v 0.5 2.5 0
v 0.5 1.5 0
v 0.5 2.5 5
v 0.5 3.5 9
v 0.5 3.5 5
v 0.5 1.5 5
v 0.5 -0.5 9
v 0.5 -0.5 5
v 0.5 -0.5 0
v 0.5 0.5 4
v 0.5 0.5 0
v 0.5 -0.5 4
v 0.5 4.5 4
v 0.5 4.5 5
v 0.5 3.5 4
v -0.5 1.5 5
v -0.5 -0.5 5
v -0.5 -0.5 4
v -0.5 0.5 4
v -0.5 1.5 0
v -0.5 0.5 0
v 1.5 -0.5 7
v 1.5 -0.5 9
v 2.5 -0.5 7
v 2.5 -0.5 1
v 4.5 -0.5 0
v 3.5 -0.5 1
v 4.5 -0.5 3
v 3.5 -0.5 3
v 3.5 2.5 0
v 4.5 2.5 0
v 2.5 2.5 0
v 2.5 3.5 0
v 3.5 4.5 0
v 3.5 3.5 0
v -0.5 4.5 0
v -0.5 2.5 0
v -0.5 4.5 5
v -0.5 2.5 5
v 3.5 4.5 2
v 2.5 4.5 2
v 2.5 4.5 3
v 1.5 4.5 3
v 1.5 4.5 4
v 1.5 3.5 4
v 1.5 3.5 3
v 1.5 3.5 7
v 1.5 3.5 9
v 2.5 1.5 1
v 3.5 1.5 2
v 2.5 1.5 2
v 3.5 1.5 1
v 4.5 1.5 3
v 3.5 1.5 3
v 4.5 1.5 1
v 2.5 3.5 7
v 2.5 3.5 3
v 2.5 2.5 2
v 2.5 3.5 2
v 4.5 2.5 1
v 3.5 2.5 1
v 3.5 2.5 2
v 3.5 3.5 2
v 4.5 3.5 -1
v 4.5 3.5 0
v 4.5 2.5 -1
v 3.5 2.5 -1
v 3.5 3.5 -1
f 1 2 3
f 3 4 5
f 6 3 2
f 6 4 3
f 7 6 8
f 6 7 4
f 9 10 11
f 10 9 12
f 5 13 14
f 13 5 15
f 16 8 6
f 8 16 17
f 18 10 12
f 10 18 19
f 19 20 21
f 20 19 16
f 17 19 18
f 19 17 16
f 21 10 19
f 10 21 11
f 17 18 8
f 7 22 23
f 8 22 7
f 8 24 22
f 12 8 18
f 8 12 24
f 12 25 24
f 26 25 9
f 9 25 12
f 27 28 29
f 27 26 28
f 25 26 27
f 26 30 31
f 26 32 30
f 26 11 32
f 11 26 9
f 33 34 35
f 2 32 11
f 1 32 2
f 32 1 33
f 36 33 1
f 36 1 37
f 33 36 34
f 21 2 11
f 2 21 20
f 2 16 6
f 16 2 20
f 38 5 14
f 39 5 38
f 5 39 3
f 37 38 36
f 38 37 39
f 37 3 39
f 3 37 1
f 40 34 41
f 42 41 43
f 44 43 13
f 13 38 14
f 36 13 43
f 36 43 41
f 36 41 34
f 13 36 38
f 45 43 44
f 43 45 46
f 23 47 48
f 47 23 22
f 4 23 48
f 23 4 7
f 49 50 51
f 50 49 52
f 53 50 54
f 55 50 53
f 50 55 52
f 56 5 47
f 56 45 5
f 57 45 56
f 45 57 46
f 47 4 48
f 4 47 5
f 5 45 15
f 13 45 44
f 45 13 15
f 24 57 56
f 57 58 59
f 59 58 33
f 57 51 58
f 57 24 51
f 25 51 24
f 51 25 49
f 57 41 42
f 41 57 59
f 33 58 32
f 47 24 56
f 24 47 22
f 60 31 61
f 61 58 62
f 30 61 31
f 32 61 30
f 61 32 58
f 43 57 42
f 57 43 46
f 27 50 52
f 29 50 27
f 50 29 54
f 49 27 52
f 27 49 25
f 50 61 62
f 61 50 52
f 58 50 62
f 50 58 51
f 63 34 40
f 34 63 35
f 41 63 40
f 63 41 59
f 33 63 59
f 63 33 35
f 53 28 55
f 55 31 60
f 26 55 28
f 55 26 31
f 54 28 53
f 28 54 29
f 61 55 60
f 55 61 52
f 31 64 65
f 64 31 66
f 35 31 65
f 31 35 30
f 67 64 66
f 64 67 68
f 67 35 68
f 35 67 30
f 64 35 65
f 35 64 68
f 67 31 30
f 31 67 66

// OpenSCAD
union() {
    translate([0, 0, 4.5]) color([1, 0, 0]) cube([1, 1, 1], center=true);
    translate([0, 1, 2.5]) cube([1, 1, 5], center=true);
    translate([0, 3, 2.5]) cube([1, 1, 5], center=true);
    translate([0, 4, 2.5]) cube([1, 1, 5], center=true);
    translate([1, 0, 4.5]) cube([1, 1, 9], center=true);
    translate([1, 1, 4.5]) cube([1, 1, 9], center=true);
    translate([1, 2, 4.5]) cube([1, 1, 9], center=true);
    translate([1, 3, 4.5]) cube([1, 1, 9], center=true);
    translate([1, 4, 2.0]) cube([1, 1, 4], center=true);
    translate([2, 0, 3.5]) cube([1, 1, 7], center=true);
    translate([2, 1, 3.5]) cube([1, 1, 7], center=true);
    translate([2, 2, 3.5]) cube([1, 1, 7], center=true);
    translate([2, 3, 3.5]) cube([1, 1, 7], center=true);
    translate([2, 4, 1.5]) cube([1, 1, 3], center=true);
    translate([3, 0, 0.5]) cube([1, 1, 1], center=true);
    translate([3, 1, 0.5]) cube([1, 1, 1], center=true);
    translate([3, 2, 1.0]) cube([1, 1, 2], center=true);
    translate([3, 4, 1.0]) cube([1, 1, 2], center=true);
    translate([4, 0, 1.5]) cube([1, 1, 3], center=true);
    translate([4, 1, 1.5]) cube([1, 1, 3], center=true);
    translate([4, 2, 0.5]) cube([1, 1, 1], center=true);
    translate([4, 3, -0.5]) color([0, 0, 1]) cube([1, 1, 1], center=true);
}
